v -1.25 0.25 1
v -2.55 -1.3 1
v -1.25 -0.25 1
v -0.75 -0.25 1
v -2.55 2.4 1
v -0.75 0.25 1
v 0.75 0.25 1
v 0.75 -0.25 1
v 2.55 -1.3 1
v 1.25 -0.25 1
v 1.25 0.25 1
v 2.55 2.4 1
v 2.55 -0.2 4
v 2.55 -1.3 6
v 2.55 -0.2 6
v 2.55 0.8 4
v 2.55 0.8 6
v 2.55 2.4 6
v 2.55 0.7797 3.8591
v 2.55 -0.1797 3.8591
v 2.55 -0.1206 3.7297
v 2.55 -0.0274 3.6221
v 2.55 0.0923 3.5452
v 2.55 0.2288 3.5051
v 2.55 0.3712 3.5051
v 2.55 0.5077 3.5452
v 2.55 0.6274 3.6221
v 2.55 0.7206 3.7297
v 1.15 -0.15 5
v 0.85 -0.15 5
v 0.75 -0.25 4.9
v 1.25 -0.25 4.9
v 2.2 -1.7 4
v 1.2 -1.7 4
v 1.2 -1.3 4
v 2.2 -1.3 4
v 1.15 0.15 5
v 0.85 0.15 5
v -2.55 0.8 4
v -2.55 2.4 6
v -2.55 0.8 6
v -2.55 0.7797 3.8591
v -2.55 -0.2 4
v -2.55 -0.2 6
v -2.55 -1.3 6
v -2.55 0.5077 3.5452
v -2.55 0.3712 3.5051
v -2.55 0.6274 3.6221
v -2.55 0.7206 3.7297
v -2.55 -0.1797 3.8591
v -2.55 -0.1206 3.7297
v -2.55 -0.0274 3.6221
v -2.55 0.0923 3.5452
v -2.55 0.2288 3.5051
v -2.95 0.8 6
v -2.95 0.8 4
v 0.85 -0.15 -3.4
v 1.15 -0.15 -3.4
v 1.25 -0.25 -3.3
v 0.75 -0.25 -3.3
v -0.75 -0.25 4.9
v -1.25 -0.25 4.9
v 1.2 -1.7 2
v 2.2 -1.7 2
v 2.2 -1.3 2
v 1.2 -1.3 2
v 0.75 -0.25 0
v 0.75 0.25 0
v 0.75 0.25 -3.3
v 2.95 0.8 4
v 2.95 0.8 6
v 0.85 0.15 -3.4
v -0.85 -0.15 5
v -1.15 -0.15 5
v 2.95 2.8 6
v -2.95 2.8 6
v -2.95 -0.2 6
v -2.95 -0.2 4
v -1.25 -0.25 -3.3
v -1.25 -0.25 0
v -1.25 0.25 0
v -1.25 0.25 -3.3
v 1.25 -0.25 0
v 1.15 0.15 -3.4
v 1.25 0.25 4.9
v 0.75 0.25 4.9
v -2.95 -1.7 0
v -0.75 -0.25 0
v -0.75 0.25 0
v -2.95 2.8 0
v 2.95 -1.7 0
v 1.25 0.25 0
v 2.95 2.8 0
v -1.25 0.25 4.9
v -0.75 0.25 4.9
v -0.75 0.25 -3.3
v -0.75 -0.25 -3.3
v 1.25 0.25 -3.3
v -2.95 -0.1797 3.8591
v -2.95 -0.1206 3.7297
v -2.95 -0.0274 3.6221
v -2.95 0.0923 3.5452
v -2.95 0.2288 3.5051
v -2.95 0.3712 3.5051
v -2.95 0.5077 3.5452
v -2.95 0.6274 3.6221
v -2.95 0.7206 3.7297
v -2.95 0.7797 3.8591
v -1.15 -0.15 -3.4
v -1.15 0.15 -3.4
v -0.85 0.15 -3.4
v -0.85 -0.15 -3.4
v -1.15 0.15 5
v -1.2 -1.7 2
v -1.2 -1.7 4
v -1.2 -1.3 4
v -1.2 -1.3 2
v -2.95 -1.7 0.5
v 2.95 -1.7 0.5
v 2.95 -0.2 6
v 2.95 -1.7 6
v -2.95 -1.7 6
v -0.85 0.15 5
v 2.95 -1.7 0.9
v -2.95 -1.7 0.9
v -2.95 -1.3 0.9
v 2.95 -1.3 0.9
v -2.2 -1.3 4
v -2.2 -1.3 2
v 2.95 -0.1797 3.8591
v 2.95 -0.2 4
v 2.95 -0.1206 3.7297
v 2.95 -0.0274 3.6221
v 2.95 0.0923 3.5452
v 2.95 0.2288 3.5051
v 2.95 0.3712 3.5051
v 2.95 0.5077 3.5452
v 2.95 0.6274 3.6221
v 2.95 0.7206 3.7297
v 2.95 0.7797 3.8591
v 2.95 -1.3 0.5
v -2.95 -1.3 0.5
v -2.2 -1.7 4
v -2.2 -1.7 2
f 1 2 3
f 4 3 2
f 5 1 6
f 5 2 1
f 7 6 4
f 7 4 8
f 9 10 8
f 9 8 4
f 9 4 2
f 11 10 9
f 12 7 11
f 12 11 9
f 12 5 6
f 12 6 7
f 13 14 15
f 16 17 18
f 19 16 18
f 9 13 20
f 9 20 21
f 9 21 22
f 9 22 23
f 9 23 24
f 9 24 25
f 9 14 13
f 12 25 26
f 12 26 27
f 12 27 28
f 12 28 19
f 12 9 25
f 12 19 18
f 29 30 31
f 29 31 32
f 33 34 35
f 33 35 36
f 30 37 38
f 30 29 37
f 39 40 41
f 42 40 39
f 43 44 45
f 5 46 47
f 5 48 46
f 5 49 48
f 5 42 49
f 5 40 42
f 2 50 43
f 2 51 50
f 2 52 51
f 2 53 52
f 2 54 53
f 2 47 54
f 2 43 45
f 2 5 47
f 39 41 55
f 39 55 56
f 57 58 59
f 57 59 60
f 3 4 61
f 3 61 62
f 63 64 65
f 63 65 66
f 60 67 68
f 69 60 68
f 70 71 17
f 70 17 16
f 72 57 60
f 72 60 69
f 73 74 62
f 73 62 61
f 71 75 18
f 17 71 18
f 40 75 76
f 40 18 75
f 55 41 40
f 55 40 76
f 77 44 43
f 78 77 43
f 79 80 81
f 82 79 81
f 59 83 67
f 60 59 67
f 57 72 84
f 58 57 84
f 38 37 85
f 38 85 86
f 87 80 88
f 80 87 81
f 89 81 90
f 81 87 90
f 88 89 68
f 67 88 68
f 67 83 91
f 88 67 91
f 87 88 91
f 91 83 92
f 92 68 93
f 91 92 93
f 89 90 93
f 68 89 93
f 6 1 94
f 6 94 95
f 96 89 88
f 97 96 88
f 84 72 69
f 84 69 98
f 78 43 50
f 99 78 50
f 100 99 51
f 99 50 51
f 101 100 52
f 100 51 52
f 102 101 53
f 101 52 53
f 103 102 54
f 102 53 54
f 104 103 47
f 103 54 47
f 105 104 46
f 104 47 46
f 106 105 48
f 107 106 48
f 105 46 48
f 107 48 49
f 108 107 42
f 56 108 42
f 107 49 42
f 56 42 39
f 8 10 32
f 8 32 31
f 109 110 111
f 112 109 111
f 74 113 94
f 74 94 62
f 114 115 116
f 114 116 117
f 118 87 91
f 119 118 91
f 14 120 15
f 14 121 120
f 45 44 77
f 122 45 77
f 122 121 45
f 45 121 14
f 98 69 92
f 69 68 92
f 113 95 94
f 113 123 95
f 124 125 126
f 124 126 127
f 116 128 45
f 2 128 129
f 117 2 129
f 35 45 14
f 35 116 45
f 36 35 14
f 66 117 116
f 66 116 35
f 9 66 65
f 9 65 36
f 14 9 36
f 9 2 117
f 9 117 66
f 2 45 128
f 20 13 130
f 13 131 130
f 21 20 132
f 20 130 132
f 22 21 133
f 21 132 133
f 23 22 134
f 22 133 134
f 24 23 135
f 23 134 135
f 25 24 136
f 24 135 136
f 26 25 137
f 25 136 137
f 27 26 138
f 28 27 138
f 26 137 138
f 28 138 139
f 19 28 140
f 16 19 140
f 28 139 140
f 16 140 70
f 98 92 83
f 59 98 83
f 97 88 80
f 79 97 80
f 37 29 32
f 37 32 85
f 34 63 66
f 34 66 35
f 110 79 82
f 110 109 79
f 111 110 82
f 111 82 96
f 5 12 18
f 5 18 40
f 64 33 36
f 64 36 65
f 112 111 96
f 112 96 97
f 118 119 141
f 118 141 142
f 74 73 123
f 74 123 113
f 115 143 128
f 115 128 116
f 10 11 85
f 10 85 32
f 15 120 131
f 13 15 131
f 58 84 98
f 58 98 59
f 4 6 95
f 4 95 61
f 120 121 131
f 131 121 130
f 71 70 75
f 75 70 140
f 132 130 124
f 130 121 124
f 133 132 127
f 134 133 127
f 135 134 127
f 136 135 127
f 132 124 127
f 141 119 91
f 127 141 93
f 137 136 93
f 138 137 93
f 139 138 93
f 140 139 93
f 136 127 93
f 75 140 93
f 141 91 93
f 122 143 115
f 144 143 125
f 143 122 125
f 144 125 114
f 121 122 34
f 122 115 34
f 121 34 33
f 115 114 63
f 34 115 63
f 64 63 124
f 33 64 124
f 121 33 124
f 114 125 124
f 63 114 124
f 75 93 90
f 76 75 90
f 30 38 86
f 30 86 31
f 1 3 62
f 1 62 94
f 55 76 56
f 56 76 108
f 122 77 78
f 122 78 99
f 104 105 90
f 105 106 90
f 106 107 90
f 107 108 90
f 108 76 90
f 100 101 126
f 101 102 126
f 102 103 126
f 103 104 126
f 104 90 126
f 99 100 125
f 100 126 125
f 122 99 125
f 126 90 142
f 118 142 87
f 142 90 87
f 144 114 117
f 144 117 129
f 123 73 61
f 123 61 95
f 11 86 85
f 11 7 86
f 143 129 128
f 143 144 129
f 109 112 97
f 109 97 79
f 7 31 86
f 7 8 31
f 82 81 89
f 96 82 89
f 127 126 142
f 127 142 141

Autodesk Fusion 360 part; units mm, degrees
sketch "Sketch1" plane through (0, 0, 0) normal (0, 0, 1) x (1, 0, 0)
  line L0 (-1.25, 0.25) -> (-0.75, 0.25)
  line L1 (-0.75, 0.25) -> (-0.75, -0.25)
  line L2 (-0.75, -0.25) -> (-1.25, -0.25)
  line L3 (-1.25, -0.25) -> (-1.25, 0.25)
  line L4 (0.75, 0.25) -> (1.25, 0.25)
  line L5 (1.25, 0.25) -> (1.25, -0.25)
  line L6 (1.25, -0.25) -> (0.75, -0.25)
  line L7 (0.75, -0.25) -> (0.75, 0.25)
  dimension "d1" = 0.5
  dimension "d2" = 0.5
  dimension "d3" = 0.5
  dimension "d4" = 0.5
  dimension "d5" = 0.75
  dimension "d6" = 0.75
  dimension "d7" = 0.25
  dimension "d8" = 0.25
extrude "Extrude1" add sketch "Sketch1" against normal blind 3.4 makes body 1 at (1.25, 0.0833, -1.1333) makes body 2 at (-1.0833, 0.25, -1.1333)
sketch "Sketch2" plane through (0, 0, 0) normal (0, 0, 1) x (1, 0, 0)
  line L0 (-2.95, 2.8) -> (2.95, 2.8)
  line L1 (2.95, 2.8) -> (2.95, -1.7)
  line L2 (2.95, -1.7) -> (-2.95, -1.7)
  line L3 (-2.95, -1.7) -> (-2.95, 2.8)
  dimension "d11" = 4.5
  dimension "d12" = 1.7
  dimension "d13" = 5.9
  dimension "d14" = 2.95
extrude "Extrude2" add sketch "Sketch2" along normal blind 1 bodies 1 2
sketch "Sketch3" plane through (0, 0, 1) normal (0, 0, 1) x (-1, 0, 0)
  line L0 (2.95, 1.7) -> (-2.95, 1.7)
  line L1 (-2.95, 1.7) -> (-2.95, -2.8)
  line L2 (-2.95, -2.8) -> (2.95, -2.8)
  line L3 (2.95, -2.8) -> (2.95, 1.7)
  line L4 (2.55, 1.3) -> (-2.55, 1.3)
  line L5 (-2.55, 1.3) -> (-2.55, -2.4)
  line L6 (-2.55, -2.4) -> (2.55, -2.4)
  line L7 (2.55, -2.4) -> (2.55, 1.3)
  dimension "d17" = -0.4
extrude "Extrude3" add sketch "Sketch3" along normal blind 5 bodies 1
sketch "Sketch4" plane through (2.95, 0, 0) normal (1, 0, 0) x (0, 1, 0)
  line L0 (-1.7, 0) -> (2.8, 0)
  line L1 (2.8, 0) -> (2.8, 6)
  line L2 (2.8, 6) -> (-1.7, 6)
  line L3 (-1.7, 6) -> (-1.7, 0)
  line L4 (-0.2, 6) -> (-0.2, 4)
  line L5 (0.8, 6) -> (0.8, 4)
  arc A0 (-0.2, 4) -> (0.8, 4) centre (0.3, 4) ccw
  line L6 (-0.2, 6) -> (0.8, 6)
  dimension "d20" = 2
  dimension "d21" = 1.5
  dimension "d22" = 1
  dimension "d23" = 1
  dimension "d24" = 2
extrude "Extrude4" cut sketch "Sketch4" against normal blind 6 contours L2 L4 L5 A0 L6 bodies 1
sketch "Sketch5" plane through (0, -1.7, 0) normal (0, -1, 0) x (1, 0, 0)
  line L0 (-2.95, 0) -> (2.95, 0)
  line L1 (2.95, 0) -> (2.95, 6)
  line L2 (2.95, 6) -> (-2.95, 6)
  line L3 (-2.95, 6) -> (-2.95, 0)
  line L4 (-2.95, 0.9) -> (2.95, 0.9)
  line L5 (2.95, 0.9) -> (2.95, 0.5)
  line L6 (2.95, 0.5) -> (-2.95, 0.5)
  line L7 (-2.95, 0.5) -> (-2.95, 0.9)
  line L8 (-2.2, 4) -> (-1.2, 4)
  line L9 (-1.2, 4) -> (-1.2, 2)
  line L10 (-1.2, 2) -> (-2.2, 2)
  line L11 (-2.2, 2) -> (-2.2, 4)
  line L12 (1.2, 4) -> (2.2, 4)
  line L13 (2.2, 4) -> (2.2, 2)
  line L14 (2.2, 2) -> (1.2, 2)
  line L15 (1.2, 2) -> (1.2, 4)
  line L16 (-2.95, 0) -> (2.95, 0)
  dimension "d27" = 0.9
  dimension "d28" = 0.4
  dimension "d29" = 1
  dimension "d30" = 1
  dimension "d31" = 2
  dimension "d32" = 2
  dimension "d33" = 0.75
  dimension "d34" = 0.75
  dimension "d35" = 2
  dimension "d36" = 2
extrude "Extrude5" cut sketch "Sketch5" against normal blind 0.4 contours L1 L3 L4 L5 L6 L7 | L8 L9 L10 L11 | L12 L13 L14 L15 bodies 1
sketch "Sketch6" plane through (0, 0, 1) normal (0, 0, 1) x (-1, 0, 0)
  line L0 (2.55, 1.3) -> (-2.55, 1.3)
  line L1 (-2.55, 1.3) -> (-2.55, -2.4)
  line L2 (-2.55, -2.4) -> (2.55, -2.4)
  line L3 (2.55, -2.4) -> (2.55, 1.3)
  line L4 (0.75, 0.25) -> (1.25, 0.25)
  line L5 (1.25, 0.25) -> (1.25, -0.25)
  line L6 (1.25, -0.25) -> (0.75, -0.25)
  line L7 (0.75, -0.25) -> (0.75, 0.25)
  line L8 (-1.25, 0.25) -> (-0.75, 0.25)
  line L9 (-0.75, 0.25) -> (-0.75, -0.25)
  line L10 (-0.75, -0.25) -> (-1.25, -0.25)
  line L11 (-1.25, -0.25) -> (-1.25, 0.25)
extrude "Extrude6" add sketch "Sketch6" along normal blind 4 contours L4 L5 L6 L7 | L8 L9 L10 L11 bodies 1
chamfer "Chamfer1" distance 0.1 angle 45 16 edges at (1.25, 0, 5) (1, 0.25, 5) (0.75, 0, 5) (1, -0.25, 5) (-0.75, 0, 5) (-1, 0.25, 5) (-1.25, 0, 5) (-1, -0.25, 5) (1.25, 0, -3.4) (1, 0.25, -3.4) (0.75, 0, -3.4) (1, -0.25, -3.4) (-0.75, 0, -3.4) (-1, -0.25, -3.4) (-1.25, 0, -3.4) (-1, 0.25, -3.4) on bodies 1
equation "d14 = ( 5.9 / 2 ) * 1 mm"
